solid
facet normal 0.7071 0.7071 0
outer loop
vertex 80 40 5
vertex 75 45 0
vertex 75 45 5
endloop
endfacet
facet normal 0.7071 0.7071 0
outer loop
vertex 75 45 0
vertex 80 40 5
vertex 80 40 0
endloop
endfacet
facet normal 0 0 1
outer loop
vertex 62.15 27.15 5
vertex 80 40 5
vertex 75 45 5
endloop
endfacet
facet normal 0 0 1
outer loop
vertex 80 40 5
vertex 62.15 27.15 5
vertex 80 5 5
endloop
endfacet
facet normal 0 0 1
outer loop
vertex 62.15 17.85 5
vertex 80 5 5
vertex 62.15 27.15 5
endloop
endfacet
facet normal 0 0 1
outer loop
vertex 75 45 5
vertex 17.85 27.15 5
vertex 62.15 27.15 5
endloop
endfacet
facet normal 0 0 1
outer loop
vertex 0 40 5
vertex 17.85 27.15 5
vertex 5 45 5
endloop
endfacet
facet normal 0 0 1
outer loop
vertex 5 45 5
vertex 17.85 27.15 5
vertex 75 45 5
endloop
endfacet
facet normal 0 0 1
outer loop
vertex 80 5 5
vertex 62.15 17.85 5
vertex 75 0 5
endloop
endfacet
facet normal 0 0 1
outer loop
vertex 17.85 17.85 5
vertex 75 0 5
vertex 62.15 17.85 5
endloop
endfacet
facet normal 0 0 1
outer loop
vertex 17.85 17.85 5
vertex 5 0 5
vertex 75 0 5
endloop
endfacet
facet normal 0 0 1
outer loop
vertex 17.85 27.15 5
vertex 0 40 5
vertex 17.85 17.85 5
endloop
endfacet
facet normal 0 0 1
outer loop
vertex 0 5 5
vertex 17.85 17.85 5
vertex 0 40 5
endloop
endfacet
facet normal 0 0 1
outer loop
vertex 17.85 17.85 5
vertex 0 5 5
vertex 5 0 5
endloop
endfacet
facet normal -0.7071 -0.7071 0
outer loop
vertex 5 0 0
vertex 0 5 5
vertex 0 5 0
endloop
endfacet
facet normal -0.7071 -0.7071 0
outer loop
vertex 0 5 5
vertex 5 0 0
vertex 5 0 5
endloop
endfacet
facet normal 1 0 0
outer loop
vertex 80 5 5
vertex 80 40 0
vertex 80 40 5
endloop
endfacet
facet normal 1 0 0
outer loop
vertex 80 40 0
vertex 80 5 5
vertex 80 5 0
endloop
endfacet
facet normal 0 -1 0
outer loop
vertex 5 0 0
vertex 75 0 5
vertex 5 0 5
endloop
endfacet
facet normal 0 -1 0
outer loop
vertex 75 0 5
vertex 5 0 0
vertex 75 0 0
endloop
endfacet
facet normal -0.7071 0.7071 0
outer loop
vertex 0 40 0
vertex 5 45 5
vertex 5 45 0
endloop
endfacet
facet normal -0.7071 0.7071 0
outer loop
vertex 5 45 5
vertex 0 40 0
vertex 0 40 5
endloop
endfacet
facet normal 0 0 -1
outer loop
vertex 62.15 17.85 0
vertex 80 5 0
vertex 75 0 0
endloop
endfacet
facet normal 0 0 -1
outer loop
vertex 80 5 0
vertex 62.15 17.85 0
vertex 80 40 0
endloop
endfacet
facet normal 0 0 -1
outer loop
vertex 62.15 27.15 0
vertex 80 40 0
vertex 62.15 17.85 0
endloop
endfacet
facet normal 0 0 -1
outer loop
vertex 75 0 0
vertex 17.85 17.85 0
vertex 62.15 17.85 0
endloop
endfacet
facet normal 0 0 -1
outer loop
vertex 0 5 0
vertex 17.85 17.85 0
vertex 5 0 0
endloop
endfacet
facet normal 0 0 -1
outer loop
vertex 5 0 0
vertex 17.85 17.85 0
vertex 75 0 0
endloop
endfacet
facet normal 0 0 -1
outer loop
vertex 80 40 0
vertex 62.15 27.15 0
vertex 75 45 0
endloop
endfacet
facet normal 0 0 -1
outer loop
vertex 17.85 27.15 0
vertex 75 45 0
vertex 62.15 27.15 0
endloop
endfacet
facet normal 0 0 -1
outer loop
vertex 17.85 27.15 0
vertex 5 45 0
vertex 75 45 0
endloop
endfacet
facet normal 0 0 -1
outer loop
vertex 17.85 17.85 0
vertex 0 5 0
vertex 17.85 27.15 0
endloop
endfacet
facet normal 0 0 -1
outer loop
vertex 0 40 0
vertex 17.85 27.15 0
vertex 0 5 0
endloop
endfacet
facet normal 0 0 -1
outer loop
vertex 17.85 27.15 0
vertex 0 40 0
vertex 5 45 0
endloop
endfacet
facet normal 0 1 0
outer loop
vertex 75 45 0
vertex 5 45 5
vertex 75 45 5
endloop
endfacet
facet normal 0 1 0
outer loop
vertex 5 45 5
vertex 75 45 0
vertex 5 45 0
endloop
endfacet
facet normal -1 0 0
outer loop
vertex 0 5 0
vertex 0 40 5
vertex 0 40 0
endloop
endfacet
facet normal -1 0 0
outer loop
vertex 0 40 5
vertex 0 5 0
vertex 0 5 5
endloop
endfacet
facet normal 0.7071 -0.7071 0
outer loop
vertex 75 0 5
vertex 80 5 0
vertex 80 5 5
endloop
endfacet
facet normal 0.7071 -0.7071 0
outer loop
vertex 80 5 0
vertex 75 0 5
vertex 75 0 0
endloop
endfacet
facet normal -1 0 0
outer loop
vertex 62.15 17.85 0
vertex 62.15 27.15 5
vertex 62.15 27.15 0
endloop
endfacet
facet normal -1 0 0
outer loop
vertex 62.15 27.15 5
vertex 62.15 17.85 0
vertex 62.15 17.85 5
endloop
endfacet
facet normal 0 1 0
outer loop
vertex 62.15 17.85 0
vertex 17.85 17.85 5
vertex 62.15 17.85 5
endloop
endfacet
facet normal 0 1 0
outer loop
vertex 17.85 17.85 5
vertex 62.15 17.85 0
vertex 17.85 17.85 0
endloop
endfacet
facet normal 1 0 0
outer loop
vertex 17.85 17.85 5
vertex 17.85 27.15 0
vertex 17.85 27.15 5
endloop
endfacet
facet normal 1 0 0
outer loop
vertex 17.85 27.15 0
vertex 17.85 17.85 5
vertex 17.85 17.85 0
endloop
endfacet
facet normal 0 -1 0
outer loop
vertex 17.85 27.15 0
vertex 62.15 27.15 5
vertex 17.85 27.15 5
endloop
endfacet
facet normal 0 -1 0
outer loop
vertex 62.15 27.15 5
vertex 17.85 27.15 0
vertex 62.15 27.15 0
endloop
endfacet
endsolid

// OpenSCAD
$fn = 32;

// ----------------------------------------------------------------------
// Windowed plate: 1 voids, 80 x 45 x 5 mm
// ----------------------------------------------------------------------

// --- parameters (mm) ---
plate_l = 80;             // plate length, X
plate_w = 45;             // plate width, Y
plate_t = 5;              // plate thickness, Z
edge_margin = 12;         // wall from the plate edge to any window
win1_l = 44.3;            // window length
win1_w = 9.3;             // window width
depth_1 = 5;              // depth of void 1 (full thickness = through)
corner_c = 5;             // corner chamfer of the plate
fit_tol = 0.05;           // declared fit tolerance (prompt contract)
free_tol = 0.2;           // declared free tolerance (prompt contract)

profile = [[5, 0], [75, 0], [80, 5], [80, 40], [75, 45], [5, 45], [0, 40], [0, 5]];  // primary outline, 8 points, counter clockwise
void_1 = [[17.85, 17.85], [62.15, 17.85], [62.15, 27.15], [17.85, 27.15]];  // large central window, 4 points

// --- the one profile operation ---
difference() {
  linear_extrude(height = plate_t) polygon(points = profile);
  translate([0, 0, -1])
    linear_extrude(height = plate_t + 2) polygon(points = void_1);
}
